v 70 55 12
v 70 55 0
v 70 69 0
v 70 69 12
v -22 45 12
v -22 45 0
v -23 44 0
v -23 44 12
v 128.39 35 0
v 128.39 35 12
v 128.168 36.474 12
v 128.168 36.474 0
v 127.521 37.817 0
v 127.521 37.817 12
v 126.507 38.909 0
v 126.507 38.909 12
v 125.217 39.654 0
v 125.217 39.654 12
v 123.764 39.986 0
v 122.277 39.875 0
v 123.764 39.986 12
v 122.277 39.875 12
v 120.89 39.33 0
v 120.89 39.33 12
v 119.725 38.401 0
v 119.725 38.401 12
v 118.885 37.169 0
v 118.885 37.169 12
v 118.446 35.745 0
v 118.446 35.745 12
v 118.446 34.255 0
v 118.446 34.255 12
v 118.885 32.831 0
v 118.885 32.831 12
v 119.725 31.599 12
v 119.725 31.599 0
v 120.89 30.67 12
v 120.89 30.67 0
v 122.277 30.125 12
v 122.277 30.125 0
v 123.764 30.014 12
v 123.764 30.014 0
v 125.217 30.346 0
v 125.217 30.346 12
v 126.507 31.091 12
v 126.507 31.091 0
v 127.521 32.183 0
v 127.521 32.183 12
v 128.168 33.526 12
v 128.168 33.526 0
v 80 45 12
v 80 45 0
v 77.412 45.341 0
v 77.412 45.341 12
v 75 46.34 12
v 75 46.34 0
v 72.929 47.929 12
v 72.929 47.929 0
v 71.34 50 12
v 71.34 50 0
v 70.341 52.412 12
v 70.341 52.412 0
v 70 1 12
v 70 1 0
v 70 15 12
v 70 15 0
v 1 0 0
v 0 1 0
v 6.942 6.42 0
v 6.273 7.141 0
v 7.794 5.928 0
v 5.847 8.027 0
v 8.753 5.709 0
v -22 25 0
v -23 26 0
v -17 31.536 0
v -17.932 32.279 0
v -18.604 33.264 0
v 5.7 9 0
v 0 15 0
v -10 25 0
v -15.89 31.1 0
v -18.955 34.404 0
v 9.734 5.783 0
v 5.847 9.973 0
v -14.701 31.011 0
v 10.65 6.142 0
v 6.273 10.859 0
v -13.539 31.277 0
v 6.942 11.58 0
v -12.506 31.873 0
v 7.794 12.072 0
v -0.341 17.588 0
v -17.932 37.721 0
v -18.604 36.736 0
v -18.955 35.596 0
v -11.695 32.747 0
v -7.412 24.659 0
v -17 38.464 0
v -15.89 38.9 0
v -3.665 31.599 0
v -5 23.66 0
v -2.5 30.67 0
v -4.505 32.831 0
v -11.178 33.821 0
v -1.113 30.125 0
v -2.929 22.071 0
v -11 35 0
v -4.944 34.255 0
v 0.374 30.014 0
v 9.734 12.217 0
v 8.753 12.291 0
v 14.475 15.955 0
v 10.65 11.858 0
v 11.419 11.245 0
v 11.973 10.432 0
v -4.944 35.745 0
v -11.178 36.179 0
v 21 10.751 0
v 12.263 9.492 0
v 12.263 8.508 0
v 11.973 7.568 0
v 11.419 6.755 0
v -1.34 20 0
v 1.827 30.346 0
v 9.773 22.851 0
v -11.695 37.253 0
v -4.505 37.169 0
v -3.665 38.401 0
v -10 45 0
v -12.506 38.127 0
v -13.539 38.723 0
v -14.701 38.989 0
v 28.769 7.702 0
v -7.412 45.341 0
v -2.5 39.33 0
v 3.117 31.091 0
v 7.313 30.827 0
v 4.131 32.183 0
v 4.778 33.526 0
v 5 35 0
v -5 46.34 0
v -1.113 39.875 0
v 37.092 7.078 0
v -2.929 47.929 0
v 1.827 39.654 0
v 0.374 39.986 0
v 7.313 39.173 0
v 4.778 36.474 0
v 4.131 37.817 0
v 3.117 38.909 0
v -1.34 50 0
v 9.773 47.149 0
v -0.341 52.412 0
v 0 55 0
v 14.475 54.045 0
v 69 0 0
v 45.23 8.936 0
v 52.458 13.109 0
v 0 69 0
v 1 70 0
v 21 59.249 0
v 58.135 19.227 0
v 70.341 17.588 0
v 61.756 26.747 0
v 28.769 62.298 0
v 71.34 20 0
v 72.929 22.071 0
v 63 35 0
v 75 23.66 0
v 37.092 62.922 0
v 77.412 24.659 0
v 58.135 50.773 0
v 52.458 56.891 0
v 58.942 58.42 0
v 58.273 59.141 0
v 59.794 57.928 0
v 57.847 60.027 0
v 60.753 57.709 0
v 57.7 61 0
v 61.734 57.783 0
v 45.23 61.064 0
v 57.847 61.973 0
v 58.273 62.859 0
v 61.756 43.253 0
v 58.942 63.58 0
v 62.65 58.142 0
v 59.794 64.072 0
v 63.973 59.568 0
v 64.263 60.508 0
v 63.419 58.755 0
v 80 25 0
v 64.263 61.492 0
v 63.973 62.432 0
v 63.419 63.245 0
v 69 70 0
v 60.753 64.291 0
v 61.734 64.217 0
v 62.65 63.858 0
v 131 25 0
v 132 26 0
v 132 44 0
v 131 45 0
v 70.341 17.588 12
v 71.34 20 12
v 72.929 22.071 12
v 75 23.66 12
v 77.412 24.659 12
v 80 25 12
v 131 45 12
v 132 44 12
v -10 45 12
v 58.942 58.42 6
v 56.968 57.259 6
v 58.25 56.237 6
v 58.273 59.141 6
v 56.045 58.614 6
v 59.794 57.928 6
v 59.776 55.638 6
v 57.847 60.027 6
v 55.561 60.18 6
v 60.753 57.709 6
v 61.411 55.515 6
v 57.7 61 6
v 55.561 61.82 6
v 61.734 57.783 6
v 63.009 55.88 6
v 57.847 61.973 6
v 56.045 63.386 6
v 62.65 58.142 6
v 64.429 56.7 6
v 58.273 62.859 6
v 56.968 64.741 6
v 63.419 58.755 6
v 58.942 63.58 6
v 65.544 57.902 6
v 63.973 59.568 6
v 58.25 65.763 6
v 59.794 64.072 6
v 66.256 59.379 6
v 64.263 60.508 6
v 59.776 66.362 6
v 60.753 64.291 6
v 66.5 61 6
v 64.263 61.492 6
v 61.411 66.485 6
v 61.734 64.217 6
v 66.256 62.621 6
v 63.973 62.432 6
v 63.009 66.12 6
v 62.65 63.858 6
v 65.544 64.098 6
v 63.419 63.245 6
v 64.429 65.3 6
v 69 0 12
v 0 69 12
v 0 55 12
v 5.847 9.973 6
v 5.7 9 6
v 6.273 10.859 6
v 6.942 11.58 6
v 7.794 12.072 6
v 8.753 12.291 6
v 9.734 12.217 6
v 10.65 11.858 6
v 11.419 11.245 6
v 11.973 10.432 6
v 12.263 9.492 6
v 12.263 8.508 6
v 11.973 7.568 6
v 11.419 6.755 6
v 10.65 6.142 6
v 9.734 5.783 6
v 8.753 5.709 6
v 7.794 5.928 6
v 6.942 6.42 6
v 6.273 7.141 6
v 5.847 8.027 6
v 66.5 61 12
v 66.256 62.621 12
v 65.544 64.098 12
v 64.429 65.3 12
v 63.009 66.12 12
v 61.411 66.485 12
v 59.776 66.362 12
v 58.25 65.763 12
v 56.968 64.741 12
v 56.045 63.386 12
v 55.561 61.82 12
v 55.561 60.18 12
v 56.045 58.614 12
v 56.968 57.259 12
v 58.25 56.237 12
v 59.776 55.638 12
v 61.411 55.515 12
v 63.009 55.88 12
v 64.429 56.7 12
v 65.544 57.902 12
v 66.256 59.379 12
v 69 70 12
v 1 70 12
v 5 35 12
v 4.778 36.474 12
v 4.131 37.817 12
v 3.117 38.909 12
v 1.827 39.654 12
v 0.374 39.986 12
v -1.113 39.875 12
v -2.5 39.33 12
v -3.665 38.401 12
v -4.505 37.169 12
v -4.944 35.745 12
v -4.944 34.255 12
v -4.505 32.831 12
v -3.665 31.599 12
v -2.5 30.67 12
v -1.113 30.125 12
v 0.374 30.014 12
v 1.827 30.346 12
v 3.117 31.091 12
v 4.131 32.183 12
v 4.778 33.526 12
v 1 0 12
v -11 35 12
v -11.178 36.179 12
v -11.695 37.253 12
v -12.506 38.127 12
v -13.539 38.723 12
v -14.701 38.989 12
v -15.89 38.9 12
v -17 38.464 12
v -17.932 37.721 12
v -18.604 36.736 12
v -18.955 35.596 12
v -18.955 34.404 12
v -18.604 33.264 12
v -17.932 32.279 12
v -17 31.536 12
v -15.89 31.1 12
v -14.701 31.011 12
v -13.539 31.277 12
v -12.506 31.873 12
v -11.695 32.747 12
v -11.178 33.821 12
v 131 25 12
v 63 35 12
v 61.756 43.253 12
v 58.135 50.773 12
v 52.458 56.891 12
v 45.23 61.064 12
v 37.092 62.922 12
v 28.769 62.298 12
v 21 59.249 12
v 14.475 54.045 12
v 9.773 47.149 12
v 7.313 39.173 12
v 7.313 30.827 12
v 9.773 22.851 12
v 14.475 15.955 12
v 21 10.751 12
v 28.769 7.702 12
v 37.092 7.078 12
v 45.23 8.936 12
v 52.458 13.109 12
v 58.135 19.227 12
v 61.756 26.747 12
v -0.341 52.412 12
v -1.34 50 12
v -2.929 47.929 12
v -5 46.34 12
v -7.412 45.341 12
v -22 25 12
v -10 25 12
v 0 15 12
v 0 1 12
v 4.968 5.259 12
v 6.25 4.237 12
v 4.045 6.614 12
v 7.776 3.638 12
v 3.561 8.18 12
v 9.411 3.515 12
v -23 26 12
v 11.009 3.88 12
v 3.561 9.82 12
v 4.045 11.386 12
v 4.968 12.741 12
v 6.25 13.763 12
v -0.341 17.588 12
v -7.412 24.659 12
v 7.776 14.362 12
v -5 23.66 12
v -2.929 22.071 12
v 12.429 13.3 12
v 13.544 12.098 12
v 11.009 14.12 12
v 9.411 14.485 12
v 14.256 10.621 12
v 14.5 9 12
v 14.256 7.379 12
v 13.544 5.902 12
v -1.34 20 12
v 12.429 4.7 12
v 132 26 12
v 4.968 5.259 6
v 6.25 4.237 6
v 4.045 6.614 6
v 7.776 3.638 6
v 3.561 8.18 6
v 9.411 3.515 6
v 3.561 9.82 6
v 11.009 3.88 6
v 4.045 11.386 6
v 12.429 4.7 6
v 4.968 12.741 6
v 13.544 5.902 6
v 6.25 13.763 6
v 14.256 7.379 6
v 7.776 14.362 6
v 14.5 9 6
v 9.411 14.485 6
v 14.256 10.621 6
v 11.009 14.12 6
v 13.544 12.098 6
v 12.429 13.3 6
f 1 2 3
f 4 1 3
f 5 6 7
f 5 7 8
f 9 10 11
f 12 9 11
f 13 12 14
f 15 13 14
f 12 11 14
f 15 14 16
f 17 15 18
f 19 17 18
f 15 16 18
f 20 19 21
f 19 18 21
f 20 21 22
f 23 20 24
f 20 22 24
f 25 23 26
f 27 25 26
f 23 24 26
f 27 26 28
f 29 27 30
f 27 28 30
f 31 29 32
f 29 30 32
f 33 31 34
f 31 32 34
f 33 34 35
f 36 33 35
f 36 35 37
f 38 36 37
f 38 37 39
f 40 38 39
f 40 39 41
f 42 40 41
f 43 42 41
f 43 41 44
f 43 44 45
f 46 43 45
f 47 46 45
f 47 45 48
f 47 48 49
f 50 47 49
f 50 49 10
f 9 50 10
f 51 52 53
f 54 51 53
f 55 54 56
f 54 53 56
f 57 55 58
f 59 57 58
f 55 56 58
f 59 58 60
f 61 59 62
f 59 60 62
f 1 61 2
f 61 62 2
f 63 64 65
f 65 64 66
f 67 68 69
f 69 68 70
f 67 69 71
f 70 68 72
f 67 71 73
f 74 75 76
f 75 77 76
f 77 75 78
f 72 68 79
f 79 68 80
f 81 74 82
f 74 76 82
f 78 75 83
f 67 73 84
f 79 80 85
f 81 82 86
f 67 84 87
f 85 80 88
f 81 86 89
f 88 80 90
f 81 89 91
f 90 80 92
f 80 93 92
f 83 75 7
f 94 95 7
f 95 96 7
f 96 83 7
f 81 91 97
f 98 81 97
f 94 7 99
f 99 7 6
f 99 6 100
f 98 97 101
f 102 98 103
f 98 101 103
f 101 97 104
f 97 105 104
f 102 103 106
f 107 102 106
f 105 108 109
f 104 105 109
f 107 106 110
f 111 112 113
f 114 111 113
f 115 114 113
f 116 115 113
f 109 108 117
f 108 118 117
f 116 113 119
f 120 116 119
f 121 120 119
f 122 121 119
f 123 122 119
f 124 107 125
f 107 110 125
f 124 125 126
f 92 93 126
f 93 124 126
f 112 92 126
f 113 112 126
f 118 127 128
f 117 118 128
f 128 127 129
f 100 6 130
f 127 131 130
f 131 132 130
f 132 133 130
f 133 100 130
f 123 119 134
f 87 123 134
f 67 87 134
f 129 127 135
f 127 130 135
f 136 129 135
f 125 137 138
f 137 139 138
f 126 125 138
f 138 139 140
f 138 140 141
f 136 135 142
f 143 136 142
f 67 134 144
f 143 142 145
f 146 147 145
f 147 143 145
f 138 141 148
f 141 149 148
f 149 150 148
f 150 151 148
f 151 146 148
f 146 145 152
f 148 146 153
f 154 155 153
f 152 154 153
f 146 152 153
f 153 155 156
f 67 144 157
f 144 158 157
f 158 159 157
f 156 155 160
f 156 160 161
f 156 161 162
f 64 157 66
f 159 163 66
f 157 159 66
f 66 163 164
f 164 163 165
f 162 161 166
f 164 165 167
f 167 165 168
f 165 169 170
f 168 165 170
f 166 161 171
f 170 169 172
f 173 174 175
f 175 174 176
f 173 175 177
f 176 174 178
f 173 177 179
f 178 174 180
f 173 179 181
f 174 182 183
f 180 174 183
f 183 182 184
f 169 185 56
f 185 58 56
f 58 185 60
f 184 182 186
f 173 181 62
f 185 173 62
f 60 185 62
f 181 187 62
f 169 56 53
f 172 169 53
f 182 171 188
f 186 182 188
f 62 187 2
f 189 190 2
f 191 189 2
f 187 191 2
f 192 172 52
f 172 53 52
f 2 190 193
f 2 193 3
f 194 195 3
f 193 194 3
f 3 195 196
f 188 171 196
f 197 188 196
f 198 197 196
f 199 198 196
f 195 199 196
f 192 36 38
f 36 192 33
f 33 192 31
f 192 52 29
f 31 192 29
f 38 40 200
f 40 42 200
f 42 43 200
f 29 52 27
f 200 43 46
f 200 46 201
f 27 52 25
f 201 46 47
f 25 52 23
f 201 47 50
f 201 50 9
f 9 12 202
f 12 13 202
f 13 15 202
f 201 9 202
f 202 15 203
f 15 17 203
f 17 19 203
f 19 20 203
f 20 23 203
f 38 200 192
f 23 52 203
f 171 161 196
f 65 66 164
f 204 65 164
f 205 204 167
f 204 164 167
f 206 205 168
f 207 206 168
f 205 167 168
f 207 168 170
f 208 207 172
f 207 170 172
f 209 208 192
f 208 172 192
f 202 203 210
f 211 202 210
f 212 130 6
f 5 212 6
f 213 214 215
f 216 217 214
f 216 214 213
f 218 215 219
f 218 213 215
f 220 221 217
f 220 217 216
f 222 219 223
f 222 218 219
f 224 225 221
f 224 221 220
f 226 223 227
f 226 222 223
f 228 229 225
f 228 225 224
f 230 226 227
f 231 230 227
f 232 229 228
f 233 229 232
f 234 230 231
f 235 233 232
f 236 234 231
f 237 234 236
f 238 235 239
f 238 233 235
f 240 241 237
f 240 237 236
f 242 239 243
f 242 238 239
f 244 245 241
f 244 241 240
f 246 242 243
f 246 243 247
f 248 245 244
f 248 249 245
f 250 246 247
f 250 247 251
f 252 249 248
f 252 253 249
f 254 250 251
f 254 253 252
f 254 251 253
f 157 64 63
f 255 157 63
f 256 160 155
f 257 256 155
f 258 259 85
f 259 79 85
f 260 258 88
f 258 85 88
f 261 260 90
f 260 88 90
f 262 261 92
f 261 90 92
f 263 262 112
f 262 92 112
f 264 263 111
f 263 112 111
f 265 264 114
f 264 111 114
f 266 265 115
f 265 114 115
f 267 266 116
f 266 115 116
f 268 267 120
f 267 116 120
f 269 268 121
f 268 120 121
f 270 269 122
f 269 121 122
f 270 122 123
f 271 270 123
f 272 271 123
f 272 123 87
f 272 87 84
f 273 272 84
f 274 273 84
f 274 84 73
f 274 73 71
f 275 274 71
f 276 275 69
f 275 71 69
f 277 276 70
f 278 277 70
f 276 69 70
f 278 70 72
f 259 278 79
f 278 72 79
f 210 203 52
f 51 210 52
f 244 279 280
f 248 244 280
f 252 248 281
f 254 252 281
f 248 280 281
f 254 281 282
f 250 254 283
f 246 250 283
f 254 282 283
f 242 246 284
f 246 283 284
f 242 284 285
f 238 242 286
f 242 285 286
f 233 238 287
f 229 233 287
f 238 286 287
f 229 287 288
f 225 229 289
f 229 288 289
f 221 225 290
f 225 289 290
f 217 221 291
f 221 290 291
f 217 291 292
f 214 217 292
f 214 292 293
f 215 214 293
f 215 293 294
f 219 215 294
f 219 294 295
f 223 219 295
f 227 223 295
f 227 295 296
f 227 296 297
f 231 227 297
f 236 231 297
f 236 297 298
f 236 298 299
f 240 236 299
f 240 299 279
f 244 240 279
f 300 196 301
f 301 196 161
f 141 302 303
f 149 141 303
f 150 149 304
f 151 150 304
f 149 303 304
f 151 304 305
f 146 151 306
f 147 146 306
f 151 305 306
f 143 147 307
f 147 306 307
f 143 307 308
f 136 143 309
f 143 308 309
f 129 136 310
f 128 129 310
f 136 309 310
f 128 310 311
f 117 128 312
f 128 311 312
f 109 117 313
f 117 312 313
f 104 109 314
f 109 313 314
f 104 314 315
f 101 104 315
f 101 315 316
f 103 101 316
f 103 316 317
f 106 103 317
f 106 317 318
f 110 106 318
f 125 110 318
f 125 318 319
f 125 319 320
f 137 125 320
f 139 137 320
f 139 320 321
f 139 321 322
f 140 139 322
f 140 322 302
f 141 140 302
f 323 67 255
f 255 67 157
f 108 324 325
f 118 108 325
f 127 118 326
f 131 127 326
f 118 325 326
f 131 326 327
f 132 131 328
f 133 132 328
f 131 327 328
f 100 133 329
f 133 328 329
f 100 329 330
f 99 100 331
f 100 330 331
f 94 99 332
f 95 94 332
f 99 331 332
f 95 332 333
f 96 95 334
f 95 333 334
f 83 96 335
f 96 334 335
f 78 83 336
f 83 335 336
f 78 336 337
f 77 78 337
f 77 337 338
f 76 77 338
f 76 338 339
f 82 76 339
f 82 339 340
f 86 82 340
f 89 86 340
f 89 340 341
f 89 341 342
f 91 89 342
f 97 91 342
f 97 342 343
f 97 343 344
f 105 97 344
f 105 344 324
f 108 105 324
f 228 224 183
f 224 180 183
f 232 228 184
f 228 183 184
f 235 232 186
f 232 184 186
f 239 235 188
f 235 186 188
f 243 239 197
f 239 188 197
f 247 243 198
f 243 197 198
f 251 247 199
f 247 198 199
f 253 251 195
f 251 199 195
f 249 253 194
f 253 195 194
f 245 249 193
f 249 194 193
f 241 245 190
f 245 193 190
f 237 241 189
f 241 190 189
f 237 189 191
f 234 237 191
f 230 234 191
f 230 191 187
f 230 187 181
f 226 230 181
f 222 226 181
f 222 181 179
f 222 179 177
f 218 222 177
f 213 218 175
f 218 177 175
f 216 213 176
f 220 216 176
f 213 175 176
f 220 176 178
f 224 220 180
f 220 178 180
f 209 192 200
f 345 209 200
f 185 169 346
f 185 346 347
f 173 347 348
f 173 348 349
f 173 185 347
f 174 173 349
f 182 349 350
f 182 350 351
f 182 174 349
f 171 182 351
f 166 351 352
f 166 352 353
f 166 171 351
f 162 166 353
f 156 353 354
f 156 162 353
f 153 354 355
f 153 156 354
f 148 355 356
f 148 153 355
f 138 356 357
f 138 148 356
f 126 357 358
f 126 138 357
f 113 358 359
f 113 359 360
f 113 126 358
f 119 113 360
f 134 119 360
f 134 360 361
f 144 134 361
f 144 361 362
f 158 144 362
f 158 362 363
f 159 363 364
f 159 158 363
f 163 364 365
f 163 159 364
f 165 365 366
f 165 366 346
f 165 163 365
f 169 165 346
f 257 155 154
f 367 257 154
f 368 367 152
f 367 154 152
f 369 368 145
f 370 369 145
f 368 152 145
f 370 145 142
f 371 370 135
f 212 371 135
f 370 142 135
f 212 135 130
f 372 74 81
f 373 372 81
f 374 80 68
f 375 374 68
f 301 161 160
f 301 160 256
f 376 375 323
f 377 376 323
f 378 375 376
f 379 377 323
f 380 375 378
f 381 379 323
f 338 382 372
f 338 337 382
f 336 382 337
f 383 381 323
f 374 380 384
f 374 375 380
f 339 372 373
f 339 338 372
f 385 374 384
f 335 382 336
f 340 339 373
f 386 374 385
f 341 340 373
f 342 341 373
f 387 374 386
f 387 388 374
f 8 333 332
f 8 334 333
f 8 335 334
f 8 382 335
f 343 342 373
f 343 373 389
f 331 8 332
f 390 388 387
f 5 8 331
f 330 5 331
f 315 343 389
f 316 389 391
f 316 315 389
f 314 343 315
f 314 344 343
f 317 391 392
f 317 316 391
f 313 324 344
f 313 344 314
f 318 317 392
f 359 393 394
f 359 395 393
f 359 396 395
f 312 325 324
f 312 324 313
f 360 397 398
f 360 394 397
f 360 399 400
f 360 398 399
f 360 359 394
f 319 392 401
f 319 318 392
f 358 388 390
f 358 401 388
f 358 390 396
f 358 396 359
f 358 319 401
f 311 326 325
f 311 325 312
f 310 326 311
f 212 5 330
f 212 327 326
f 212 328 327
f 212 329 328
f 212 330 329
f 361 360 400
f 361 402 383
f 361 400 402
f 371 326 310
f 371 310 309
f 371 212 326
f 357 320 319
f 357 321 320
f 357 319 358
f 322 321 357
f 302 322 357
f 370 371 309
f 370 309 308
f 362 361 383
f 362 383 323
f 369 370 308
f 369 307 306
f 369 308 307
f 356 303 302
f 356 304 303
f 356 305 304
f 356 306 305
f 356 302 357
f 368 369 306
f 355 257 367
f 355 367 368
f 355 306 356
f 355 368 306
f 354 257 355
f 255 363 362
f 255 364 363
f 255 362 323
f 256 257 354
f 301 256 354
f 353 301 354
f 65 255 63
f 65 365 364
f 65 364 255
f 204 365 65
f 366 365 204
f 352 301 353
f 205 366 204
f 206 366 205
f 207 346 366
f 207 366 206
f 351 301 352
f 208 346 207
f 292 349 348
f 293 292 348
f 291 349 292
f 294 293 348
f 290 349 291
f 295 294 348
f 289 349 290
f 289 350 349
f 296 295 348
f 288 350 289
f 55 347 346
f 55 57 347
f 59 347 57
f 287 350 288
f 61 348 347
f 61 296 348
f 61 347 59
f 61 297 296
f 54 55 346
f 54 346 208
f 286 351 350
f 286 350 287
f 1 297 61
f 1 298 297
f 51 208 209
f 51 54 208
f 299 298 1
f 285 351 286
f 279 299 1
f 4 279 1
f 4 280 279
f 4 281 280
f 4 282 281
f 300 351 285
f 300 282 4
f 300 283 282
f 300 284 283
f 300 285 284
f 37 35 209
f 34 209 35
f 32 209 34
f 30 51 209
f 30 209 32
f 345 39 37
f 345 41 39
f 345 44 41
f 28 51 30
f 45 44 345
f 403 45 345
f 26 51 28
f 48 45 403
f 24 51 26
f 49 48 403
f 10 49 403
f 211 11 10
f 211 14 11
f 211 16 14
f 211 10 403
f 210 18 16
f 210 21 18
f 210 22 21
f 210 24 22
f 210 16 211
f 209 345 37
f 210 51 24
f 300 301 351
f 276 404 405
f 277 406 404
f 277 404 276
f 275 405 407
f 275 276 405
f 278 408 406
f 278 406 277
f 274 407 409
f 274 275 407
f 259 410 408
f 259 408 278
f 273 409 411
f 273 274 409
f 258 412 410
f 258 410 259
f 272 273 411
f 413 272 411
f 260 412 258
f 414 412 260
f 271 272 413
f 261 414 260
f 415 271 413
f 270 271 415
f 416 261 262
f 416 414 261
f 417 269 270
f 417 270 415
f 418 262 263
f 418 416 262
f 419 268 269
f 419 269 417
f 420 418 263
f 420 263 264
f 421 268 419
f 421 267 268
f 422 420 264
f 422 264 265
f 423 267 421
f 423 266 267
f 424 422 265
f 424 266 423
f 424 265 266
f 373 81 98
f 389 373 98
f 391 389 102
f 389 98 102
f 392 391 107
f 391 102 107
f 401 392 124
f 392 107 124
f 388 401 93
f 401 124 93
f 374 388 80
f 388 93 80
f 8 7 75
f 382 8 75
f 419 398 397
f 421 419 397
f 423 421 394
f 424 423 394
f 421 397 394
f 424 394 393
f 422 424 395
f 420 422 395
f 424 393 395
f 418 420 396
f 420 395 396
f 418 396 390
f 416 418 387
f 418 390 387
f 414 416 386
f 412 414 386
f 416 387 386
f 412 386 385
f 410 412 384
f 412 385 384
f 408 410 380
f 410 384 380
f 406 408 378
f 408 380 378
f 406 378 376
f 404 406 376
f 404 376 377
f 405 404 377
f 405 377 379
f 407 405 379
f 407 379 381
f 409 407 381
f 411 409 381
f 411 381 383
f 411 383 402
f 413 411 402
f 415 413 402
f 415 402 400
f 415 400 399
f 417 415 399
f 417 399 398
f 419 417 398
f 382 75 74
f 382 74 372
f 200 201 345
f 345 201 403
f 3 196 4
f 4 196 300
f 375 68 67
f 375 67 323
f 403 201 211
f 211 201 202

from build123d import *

# Parameters (mm, degrees)
ESQUISSE4_R             = 28
BASE_EXTRUSION_DEPTH    = 12
CHANFREIN2_SIZE         = 1
PER_AGE1_D              = 6.6
PER_AGE1_CBORE_D        = 11
PER_AGE1_CBORE_DEPTH    = 6
ESQUISSE7_R             = 5
ESQUISSE7_R_2           = 4
ENL_V_MAT_EXTRU_1_DEPTH = 150.89329538


with BuildPart() as part:
    # Esquisse4 → Base-Extrusion (new body)
    with BuildSketch(Plane.XY):
        with BuildLine():
            Line((0, 0), (70, 0))
            Line((70, 0), (70, 15))
            ThreePointArc((70, 15), (72.928932188, 22.071067812), (80, 25))
            Line((80, 25), (132, 25))
            Line((132, 25), (132, 45))
            Line((132, 45), (80, 45))
            ThreePointArc((80, 45), (72.928932188, 47.928932188), (70, 55))
            Line((70, 55), (70, 70))
            Line((70, 70), (0, 70))
            Line((0, 70), (0, 55))
            ThreePointArc((0, 55), (-2.928932188, 47.928932188), (-10, 45))
            Line((-10, 45), (-23, 45))
            Line((-23, 45), (-23, 25))
            Line((-23, 25), (-10, 25))
            ThreePointArc((-10, 25), (-2.928932188, 22.071067812), (0, 15))
            Line((0, 15), (0, 0))
        make_face()
        with Locations((35, 35)):
            Circle(ESQUISSE4_R, mode=Mode.SUBTRACT)
    extrude(amount=BASE_EXTRUSION_DEPTH)

    # Chanfrein2
    chanfrein2_edges = [part.edges().sort_by_distance(p)[0] for p in [
        (-23, 45, 6),
        (-23, 25, 6),
        (0, 0, 6),
        (70, 0, 6),
        (132, 25, 6),
        (132, 45, 6),
        (70, 70, 6),
        (0, 70, 6),
    ]]
    chamfer(chanfrein2_edges, length=CHANFREIN2_SIZE)

    # Perçage1 (through all)
    with Locations(Plane.XY.offset(12)):
        with Locations((9, 9), (61, 61)):
            CounterBoreHole(PER_AGE1_D / 2, PER_AGE1_CBORE_D / 2, PER_AGE1_CBORE_DEPTH)

    # Esquisse7 → Enlèv. mat.-Extru.1 (cut, through all)
    with BuildSketch(Plane.XY.offset(12)):
        with Locations((0, 35)):
            Circle(ESQUISSE7_R)
        with Locations((-15, 35)):
            Circle(ESQUISSE7_R_2)
        with Locations((123.39, 35)):
            Circle(ESQUISSE7_R)
    extrude(amount=-ENL_V_MAT_EXTRU_1_DEPTH, mode=Mode.SUBTRACT)


solid = part.part
